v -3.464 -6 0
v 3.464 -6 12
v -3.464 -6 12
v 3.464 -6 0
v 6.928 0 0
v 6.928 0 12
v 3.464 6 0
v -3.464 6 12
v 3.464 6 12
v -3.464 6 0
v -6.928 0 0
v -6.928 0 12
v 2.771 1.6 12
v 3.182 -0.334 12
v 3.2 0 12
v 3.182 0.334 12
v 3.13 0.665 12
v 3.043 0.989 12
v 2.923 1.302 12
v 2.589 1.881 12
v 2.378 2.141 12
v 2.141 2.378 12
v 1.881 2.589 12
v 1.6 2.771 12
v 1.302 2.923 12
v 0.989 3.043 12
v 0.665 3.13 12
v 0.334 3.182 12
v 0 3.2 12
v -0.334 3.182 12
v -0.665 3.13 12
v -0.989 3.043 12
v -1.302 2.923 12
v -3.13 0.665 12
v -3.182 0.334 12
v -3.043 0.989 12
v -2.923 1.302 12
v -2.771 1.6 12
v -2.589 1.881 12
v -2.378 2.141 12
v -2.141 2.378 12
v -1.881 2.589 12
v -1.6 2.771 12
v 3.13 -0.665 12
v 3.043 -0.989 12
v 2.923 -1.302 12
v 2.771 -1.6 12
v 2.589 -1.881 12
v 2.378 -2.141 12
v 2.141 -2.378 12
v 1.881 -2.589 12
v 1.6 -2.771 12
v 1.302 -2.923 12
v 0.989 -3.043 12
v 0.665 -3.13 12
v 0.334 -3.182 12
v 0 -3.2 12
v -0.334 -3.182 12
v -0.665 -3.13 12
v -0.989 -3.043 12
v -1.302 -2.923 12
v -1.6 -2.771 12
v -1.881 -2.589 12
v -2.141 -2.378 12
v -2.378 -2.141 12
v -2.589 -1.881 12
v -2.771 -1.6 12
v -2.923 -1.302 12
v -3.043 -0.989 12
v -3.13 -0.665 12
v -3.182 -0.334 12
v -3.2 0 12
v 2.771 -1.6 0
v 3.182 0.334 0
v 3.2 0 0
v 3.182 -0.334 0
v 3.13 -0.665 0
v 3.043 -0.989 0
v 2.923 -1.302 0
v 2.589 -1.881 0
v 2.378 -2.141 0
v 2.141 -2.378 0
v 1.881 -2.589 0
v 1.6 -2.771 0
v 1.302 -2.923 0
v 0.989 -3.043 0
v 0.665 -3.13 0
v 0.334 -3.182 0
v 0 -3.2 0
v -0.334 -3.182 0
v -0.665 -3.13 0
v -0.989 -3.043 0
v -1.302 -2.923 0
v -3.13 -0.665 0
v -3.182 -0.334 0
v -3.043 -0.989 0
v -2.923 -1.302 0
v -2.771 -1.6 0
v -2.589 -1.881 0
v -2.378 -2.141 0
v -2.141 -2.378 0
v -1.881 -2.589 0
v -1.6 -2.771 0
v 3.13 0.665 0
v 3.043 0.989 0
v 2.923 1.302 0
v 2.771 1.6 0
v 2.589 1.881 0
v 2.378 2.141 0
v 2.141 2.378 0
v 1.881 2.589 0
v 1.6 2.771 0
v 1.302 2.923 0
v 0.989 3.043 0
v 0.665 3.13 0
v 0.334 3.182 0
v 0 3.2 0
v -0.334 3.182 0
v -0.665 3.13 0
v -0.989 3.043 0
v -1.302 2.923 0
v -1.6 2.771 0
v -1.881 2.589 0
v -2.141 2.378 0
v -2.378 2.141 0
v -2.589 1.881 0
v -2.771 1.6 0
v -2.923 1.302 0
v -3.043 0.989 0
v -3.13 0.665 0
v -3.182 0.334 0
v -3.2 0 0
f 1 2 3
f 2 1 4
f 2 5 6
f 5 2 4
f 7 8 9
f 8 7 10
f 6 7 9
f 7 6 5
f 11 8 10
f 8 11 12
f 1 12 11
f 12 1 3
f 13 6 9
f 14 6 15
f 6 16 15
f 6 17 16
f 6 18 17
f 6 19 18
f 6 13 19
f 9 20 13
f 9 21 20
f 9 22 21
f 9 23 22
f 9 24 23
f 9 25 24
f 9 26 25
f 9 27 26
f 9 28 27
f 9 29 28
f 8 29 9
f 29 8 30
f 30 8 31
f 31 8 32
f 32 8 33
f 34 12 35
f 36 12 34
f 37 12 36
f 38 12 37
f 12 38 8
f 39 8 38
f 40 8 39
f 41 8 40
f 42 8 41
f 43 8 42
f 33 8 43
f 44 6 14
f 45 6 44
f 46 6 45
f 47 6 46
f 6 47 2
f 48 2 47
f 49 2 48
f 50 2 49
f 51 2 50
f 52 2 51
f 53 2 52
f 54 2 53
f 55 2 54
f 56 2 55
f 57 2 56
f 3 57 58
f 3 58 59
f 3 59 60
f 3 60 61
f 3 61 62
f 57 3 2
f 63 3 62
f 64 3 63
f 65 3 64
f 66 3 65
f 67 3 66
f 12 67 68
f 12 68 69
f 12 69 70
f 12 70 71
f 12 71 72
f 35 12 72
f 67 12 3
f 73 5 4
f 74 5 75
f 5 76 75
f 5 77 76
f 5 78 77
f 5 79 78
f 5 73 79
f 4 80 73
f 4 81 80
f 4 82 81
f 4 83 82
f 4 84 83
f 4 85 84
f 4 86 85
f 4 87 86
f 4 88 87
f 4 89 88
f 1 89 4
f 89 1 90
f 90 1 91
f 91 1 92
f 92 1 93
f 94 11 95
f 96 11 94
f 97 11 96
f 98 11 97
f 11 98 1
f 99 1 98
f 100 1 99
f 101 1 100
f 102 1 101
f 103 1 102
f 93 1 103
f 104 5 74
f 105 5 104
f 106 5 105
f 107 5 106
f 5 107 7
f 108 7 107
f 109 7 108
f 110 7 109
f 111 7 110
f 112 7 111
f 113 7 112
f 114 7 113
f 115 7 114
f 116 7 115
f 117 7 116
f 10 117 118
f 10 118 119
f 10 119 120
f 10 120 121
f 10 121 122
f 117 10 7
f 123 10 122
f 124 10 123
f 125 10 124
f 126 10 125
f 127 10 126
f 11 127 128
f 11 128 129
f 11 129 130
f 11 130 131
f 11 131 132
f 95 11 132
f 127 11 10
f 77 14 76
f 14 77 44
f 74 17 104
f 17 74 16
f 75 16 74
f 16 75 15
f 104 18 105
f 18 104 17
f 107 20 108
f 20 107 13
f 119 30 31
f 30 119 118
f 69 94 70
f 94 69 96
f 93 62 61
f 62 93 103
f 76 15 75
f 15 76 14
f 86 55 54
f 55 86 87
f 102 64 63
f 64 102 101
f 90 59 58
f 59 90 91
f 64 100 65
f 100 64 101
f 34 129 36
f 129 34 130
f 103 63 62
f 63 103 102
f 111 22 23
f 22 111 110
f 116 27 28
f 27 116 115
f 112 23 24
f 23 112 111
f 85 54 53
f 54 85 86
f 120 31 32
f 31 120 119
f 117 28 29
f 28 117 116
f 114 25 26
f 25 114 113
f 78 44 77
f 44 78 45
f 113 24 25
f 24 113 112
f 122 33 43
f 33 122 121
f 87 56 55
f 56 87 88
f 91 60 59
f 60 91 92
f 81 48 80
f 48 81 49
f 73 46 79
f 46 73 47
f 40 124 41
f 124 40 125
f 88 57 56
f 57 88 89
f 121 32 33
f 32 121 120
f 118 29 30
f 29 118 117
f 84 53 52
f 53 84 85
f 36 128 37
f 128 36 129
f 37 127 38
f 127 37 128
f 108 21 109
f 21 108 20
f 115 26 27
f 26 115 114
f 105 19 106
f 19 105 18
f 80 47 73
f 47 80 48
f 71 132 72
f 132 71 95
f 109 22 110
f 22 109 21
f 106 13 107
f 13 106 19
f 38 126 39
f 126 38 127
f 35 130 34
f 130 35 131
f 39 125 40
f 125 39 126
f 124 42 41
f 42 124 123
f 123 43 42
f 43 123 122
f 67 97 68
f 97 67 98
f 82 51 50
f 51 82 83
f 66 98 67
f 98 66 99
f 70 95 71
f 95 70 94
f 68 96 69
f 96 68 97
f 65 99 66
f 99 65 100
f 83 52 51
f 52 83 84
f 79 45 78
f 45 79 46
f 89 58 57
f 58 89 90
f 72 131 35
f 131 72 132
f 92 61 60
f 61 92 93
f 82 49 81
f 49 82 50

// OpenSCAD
// Hex spacer.
$fn = 60;
eps = 0.02;
inner_d = 6.4;
flat = 12;
length = 12;
difference() { cylinder(d=flat/cos(30),h=length,$fn=6); translate([0,0,-eps]) cylinder(d=inner_d,h=length+2*eps); }
